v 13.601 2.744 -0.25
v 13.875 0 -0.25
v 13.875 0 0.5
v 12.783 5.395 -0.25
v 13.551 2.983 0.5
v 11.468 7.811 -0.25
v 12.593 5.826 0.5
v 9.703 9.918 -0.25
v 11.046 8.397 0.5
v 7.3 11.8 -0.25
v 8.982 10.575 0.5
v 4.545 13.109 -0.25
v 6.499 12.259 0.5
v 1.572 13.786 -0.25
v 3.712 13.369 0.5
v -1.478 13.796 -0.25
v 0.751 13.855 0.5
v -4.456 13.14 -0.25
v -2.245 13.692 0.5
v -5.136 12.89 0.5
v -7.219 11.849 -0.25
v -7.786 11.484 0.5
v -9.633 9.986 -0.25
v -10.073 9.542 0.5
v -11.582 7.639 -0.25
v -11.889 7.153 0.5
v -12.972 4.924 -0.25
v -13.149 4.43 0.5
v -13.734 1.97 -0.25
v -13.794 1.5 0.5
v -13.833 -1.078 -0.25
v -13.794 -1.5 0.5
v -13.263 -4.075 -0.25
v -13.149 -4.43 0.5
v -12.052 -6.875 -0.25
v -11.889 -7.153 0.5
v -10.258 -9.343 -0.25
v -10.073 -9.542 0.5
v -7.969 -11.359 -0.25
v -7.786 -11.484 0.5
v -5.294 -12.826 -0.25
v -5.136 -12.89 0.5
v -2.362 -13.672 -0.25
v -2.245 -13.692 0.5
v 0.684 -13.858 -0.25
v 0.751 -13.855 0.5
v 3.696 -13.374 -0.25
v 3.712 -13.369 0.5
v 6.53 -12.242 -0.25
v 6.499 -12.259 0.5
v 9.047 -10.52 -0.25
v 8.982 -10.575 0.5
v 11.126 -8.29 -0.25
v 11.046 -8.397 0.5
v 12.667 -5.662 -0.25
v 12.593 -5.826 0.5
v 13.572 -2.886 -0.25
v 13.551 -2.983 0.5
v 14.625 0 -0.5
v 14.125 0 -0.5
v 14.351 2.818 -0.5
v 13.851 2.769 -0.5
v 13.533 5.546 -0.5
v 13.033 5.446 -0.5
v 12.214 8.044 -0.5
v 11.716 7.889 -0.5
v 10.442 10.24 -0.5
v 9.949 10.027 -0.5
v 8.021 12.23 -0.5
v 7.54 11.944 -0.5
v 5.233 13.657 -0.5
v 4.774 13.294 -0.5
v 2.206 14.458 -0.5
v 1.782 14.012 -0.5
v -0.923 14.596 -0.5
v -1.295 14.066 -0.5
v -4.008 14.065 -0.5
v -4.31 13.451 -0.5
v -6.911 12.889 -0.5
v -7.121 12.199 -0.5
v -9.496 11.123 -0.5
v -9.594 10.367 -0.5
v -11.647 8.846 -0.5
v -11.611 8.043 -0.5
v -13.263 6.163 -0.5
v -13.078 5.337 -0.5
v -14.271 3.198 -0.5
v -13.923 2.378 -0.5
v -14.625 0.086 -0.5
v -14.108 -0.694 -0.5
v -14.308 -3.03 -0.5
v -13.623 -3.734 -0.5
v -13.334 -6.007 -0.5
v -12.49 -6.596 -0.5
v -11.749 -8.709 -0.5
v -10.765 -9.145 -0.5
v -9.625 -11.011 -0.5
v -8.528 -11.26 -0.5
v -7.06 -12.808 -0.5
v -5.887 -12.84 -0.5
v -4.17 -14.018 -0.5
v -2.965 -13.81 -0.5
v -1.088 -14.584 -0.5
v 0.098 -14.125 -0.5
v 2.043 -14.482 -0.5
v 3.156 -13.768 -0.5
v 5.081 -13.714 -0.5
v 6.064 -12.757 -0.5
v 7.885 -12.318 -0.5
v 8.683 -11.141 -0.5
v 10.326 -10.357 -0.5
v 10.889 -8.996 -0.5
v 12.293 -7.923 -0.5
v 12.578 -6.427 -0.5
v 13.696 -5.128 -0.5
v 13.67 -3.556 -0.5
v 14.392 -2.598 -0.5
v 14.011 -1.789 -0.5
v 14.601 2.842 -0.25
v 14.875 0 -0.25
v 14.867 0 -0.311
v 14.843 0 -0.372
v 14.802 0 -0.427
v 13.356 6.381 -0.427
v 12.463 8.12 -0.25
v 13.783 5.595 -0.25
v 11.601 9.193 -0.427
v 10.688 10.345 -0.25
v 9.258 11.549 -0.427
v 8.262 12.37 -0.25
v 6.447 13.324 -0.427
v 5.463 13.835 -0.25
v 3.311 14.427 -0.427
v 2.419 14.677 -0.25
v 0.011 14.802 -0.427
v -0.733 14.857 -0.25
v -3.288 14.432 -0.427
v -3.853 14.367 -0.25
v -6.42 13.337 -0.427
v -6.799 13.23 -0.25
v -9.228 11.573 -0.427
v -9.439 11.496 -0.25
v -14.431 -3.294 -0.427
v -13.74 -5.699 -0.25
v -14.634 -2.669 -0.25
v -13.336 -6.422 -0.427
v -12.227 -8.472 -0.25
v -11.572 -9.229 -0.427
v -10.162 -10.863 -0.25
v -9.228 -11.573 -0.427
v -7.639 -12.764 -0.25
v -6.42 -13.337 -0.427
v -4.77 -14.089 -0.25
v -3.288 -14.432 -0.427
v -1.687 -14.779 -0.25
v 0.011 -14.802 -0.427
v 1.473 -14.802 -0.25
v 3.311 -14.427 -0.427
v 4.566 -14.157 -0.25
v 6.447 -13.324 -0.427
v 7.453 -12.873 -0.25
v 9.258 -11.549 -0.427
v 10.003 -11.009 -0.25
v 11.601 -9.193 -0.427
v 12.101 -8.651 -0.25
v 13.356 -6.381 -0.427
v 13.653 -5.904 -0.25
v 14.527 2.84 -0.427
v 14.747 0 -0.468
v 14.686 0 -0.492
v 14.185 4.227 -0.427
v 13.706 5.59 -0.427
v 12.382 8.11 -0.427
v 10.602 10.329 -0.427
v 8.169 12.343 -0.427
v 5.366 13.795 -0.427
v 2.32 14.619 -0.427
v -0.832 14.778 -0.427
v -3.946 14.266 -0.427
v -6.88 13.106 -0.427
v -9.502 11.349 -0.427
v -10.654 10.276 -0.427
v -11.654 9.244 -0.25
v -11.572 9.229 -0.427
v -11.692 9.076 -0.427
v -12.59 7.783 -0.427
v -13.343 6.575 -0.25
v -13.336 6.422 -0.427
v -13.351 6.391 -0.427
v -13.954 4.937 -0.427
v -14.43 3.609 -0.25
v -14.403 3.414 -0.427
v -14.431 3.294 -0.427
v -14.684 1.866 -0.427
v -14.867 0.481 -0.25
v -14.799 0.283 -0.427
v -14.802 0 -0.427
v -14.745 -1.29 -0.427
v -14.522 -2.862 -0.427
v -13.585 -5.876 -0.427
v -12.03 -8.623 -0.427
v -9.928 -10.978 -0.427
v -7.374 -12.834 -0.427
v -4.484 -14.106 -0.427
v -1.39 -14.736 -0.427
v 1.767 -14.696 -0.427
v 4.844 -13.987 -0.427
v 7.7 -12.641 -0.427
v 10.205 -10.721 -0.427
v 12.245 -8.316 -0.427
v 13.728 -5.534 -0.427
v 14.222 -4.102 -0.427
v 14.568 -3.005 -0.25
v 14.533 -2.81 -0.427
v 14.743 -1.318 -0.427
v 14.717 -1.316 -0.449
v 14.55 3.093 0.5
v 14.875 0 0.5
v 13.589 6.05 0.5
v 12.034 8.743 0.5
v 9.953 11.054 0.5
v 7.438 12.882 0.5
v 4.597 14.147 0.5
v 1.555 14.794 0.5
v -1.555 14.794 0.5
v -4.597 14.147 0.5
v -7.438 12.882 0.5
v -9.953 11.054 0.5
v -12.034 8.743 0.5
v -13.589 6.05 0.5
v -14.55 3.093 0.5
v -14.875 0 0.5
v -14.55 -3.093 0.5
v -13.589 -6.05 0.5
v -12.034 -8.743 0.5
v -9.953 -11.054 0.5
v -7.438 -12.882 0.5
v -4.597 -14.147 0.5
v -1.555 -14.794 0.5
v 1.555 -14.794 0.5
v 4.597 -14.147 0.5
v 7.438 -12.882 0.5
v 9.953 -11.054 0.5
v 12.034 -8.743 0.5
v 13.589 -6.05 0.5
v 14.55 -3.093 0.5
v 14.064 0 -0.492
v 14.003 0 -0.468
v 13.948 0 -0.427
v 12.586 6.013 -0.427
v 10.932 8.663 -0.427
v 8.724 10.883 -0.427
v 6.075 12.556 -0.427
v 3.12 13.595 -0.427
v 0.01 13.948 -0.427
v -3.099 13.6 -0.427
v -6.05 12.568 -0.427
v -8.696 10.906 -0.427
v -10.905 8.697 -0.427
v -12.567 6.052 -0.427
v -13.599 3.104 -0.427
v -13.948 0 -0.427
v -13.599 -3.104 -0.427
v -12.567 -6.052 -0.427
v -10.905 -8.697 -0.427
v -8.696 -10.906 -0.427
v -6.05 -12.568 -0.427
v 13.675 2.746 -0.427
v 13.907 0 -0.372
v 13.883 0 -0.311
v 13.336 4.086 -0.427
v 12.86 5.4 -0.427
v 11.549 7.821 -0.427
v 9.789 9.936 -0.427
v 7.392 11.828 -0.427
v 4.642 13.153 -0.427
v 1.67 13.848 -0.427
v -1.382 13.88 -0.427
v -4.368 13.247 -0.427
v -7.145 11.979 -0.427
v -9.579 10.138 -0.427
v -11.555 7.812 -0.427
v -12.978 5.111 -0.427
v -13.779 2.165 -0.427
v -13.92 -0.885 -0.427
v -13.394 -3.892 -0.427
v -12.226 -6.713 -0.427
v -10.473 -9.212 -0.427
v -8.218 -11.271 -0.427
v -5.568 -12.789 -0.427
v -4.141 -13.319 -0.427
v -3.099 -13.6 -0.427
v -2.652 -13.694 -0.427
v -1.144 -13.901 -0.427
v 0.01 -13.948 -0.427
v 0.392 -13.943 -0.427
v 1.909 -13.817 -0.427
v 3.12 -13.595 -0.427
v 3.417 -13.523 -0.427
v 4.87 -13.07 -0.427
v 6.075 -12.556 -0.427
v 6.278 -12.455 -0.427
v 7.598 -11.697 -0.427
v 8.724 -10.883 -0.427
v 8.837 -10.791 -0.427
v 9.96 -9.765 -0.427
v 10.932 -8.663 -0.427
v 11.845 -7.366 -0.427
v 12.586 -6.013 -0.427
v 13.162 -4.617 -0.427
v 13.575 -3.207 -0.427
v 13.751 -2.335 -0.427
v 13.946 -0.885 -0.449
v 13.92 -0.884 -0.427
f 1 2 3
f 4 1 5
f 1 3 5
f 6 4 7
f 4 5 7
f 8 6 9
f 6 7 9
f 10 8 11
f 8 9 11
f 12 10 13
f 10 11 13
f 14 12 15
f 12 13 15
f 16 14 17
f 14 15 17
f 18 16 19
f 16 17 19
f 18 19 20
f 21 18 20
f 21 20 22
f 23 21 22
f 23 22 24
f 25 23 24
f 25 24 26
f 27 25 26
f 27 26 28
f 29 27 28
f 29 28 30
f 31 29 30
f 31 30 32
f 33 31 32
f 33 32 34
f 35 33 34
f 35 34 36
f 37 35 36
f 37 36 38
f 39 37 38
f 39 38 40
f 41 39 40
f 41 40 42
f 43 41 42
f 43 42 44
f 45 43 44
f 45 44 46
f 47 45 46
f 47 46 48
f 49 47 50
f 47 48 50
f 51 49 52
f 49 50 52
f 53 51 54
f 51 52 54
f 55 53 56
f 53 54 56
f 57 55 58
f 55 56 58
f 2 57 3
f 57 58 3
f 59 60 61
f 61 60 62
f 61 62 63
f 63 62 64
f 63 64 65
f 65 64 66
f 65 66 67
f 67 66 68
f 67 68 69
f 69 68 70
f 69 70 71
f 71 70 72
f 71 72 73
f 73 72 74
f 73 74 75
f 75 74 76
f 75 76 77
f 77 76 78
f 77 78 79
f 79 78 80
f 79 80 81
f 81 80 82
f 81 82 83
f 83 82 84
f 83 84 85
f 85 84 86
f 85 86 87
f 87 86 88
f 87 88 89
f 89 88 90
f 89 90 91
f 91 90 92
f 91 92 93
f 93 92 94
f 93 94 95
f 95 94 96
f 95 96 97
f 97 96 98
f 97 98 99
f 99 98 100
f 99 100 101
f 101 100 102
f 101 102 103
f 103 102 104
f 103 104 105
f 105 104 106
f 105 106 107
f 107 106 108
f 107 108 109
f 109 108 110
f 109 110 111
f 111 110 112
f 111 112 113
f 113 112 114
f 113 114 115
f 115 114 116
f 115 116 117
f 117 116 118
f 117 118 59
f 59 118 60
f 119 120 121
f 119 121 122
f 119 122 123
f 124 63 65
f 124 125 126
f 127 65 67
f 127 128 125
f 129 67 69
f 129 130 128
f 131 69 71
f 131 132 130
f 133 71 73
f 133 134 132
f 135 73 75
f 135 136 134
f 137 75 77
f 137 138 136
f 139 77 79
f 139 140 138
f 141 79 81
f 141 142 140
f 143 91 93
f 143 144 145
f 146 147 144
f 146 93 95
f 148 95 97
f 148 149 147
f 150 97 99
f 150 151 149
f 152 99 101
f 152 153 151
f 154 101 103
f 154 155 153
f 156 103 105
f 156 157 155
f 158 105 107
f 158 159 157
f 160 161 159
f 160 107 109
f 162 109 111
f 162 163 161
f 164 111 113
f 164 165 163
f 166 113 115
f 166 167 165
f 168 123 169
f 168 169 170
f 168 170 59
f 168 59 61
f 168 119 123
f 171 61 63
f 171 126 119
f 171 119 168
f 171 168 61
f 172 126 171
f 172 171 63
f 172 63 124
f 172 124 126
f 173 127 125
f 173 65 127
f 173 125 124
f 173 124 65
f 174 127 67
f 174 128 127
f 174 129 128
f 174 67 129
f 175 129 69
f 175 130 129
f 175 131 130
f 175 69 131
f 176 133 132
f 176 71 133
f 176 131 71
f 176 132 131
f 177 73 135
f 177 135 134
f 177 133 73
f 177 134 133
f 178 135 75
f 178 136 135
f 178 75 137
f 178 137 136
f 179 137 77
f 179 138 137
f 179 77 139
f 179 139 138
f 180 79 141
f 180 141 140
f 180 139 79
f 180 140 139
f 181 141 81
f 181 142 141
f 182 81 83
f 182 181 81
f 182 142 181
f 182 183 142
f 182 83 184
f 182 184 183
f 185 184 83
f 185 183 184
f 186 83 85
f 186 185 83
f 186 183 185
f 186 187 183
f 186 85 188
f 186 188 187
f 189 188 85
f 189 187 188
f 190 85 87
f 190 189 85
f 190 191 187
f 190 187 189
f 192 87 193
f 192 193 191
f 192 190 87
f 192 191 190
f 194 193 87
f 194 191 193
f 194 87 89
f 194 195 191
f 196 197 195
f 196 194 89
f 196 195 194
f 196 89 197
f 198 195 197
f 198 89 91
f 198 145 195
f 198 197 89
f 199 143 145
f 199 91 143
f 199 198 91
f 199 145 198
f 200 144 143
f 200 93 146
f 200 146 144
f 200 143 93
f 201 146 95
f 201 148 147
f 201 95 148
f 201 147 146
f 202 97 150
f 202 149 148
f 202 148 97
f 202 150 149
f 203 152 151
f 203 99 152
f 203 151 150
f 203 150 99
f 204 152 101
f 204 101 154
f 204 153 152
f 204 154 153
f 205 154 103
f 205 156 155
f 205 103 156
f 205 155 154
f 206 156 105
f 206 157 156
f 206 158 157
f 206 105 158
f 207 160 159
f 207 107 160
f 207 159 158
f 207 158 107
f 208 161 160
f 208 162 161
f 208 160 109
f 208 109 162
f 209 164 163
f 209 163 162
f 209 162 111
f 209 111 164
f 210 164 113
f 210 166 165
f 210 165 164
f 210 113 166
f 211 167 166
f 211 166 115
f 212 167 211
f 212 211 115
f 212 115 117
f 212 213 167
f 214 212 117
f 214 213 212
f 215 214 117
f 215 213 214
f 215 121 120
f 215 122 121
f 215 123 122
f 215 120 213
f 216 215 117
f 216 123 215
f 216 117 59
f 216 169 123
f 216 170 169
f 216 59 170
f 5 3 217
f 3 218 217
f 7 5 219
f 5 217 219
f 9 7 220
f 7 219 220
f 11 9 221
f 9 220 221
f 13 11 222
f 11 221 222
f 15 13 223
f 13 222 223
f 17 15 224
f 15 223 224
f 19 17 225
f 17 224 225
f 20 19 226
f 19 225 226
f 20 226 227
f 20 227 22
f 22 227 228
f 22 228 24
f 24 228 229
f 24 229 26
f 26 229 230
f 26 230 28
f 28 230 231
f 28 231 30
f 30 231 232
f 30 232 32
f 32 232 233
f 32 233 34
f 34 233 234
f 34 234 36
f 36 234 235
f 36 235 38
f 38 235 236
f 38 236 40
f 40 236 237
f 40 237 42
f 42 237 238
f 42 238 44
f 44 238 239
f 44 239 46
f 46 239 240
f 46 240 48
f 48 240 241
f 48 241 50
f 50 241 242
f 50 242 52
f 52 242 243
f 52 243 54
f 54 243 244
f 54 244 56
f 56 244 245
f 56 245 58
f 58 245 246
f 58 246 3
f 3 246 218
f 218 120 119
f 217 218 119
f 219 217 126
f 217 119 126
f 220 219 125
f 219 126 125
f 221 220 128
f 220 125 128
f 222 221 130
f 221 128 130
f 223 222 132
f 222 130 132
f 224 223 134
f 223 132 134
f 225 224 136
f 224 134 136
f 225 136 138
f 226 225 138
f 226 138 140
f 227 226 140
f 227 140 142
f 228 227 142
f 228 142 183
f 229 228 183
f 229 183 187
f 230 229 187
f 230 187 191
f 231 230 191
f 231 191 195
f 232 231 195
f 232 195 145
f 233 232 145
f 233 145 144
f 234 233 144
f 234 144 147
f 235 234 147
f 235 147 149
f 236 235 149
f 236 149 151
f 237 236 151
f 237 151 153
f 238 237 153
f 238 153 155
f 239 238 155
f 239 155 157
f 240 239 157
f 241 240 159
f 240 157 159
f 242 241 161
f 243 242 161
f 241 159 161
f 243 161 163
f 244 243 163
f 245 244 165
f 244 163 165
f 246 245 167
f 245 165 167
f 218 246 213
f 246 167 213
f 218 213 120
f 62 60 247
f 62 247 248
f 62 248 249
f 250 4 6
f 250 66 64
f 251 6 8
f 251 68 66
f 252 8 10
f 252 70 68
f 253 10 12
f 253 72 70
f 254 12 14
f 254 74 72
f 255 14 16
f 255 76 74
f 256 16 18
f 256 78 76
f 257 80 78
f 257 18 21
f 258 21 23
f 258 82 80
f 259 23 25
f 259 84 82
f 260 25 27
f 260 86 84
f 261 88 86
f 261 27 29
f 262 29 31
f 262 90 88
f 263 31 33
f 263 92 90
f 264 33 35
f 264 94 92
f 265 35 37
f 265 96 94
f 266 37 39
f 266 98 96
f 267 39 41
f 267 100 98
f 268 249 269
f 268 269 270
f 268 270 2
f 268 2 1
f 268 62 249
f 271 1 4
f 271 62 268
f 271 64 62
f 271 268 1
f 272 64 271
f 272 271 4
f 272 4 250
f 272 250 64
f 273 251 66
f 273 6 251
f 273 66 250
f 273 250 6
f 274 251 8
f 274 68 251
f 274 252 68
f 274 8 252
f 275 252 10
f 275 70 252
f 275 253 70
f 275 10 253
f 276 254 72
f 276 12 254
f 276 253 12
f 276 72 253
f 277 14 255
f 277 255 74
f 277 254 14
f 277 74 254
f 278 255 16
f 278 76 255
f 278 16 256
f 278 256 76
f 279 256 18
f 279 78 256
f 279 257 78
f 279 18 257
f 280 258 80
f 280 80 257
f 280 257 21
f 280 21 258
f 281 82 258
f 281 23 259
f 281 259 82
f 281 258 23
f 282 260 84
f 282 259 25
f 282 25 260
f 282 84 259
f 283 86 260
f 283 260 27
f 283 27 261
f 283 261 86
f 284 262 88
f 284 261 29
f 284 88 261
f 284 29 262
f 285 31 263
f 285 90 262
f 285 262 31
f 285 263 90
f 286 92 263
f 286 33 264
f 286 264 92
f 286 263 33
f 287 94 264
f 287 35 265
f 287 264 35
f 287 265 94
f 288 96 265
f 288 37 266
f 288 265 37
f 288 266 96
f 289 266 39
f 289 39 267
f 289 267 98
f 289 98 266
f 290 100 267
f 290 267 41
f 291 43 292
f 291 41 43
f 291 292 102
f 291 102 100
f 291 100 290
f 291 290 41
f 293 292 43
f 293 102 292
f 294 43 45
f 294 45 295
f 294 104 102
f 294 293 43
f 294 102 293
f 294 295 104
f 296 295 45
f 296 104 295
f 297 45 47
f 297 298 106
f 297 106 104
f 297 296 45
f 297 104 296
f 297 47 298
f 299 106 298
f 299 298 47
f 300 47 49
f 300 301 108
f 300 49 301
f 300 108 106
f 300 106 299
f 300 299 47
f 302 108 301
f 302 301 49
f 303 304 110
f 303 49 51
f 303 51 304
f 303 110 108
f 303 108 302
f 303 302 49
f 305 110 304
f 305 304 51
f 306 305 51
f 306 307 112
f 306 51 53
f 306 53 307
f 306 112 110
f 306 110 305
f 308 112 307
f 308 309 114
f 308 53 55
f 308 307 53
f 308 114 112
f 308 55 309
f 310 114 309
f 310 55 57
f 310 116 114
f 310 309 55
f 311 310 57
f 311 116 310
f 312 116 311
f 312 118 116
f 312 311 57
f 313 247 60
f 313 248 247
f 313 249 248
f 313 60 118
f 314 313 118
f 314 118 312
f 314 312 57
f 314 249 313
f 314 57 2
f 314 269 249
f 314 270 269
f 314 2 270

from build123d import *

# Parameters (mm, degrees)
SKETCH015_W = 1
SKETCH015_H = 1
FILLET001_R = 0.25
FILLET002_R = 0.25


with BuildPart() as part:
    # Sweep005: sweep along a path in Sketch016
    with BuildLine(Plane.XY) as sweep005_path:
        CenterArc((0, 0), 13.875, 0, 360)
    # Sketch015 → Sweep005 (sweep)
    with BuildSketch(Plane.XZ):
        with Locations((-14.375, 0)):
            Rectangle(SKETCH015_W, SKETCH015_H)
    sweep(path=sweep005_path.line)

    # Fillet001
    fillet001_edges = [part.edges().sort_by_distance(p)[0] for p in [
        (-14.875, 0, -0.5),
    ]]
    fillet(fillet001_edges, radius=FILLET001_R)

    # Fillet002
    fillet002_edges = [part.edges().sort_by_distance(p)[0] for p in [
        (-13.875, 0, -0.5),
    ]]
    fillet(fillet002_edges, radius=FILLET002_R)


solid = part.part
